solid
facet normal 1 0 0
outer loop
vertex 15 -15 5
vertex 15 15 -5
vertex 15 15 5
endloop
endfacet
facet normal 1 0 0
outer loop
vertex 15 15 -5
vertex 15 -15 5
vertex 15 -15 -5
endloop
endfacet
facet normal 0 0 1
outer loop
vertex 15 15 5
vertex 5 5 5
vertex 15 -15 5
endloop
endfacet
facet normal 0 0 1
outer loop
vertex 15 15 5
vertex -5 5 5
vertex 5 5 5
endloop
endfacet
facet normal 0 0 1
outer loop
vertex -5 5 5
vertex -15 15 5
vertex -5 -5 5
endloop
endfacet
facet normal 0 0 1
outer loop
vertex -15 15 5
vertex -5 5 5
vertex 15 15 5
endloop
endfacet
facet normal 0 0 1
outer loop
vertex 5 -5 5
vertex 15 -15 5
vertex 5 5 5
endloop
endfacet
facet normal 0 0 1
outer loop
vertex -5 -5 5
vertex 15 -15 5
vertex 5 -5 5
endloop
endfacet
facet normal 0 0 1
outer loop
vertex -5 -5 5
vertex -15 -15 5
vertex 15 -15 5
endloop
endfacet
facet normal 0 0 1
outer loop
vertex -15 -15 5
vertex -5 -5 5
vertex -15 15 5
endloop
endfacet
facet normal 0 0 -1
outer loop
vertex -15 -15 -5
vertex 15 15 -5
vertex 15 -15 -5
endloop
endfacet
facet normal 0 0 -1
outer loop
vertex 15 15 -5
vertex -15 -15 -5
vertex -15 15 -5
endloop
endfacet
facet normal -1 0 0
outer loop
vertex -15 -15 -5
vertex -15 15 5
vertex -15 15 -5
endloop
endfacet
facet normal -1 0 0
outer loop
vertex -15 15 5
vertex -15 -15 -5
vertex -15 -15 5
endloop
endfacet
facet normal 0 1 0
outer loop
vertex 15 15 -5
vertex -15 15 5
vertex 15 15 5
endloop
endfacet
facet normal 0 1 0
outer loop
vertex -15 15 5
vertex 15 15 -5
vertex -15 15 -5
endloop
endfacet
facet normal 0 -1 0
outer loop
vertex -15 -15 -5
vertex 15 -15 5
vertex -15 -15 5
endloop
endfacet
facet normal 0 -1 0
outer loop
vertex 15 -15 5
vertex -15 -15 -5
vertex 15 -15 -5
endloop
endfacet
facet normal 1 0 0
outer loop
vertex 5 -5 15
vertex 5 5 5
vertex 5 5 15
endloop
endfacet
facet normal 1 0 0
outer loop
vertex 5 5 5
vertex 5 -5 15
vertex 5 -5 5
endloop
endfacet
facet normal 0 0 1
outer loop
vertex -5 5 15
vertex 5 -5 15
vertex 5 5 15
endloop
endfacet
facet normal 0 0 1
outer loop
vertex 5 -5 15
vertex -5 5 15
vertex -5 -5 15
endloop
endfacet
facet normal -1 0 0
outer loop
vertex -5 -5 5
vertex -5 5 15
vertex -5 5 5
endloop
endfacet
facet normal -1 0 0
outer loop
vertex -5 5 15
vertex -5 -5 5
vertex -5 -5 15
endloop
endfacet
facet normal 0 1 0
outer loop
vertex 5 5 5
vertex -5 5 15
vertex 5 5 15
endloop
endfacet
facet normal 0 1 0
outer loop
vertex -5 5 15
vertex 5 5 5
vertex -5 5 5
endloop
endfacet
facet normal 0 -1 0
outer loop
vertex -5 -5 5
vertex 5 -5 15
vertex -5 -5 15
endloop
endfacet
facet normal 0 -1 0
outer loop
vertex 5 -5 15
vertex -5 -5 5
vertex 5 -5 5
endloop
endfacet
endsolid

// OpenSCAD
//apilando objetos


cuboBase = [30,30,10];
cuboPilar = [10,10,10];

x=0;
y=1;
z=2;

posicionPilar = [0,0,(cuboPilar[z]/2)+(cuboBase[z]/2)];


color("red") union(){
cube(cuboBase,center=true);



translate(posicionPilar)
cube(cuboPilar,center=true);
}
